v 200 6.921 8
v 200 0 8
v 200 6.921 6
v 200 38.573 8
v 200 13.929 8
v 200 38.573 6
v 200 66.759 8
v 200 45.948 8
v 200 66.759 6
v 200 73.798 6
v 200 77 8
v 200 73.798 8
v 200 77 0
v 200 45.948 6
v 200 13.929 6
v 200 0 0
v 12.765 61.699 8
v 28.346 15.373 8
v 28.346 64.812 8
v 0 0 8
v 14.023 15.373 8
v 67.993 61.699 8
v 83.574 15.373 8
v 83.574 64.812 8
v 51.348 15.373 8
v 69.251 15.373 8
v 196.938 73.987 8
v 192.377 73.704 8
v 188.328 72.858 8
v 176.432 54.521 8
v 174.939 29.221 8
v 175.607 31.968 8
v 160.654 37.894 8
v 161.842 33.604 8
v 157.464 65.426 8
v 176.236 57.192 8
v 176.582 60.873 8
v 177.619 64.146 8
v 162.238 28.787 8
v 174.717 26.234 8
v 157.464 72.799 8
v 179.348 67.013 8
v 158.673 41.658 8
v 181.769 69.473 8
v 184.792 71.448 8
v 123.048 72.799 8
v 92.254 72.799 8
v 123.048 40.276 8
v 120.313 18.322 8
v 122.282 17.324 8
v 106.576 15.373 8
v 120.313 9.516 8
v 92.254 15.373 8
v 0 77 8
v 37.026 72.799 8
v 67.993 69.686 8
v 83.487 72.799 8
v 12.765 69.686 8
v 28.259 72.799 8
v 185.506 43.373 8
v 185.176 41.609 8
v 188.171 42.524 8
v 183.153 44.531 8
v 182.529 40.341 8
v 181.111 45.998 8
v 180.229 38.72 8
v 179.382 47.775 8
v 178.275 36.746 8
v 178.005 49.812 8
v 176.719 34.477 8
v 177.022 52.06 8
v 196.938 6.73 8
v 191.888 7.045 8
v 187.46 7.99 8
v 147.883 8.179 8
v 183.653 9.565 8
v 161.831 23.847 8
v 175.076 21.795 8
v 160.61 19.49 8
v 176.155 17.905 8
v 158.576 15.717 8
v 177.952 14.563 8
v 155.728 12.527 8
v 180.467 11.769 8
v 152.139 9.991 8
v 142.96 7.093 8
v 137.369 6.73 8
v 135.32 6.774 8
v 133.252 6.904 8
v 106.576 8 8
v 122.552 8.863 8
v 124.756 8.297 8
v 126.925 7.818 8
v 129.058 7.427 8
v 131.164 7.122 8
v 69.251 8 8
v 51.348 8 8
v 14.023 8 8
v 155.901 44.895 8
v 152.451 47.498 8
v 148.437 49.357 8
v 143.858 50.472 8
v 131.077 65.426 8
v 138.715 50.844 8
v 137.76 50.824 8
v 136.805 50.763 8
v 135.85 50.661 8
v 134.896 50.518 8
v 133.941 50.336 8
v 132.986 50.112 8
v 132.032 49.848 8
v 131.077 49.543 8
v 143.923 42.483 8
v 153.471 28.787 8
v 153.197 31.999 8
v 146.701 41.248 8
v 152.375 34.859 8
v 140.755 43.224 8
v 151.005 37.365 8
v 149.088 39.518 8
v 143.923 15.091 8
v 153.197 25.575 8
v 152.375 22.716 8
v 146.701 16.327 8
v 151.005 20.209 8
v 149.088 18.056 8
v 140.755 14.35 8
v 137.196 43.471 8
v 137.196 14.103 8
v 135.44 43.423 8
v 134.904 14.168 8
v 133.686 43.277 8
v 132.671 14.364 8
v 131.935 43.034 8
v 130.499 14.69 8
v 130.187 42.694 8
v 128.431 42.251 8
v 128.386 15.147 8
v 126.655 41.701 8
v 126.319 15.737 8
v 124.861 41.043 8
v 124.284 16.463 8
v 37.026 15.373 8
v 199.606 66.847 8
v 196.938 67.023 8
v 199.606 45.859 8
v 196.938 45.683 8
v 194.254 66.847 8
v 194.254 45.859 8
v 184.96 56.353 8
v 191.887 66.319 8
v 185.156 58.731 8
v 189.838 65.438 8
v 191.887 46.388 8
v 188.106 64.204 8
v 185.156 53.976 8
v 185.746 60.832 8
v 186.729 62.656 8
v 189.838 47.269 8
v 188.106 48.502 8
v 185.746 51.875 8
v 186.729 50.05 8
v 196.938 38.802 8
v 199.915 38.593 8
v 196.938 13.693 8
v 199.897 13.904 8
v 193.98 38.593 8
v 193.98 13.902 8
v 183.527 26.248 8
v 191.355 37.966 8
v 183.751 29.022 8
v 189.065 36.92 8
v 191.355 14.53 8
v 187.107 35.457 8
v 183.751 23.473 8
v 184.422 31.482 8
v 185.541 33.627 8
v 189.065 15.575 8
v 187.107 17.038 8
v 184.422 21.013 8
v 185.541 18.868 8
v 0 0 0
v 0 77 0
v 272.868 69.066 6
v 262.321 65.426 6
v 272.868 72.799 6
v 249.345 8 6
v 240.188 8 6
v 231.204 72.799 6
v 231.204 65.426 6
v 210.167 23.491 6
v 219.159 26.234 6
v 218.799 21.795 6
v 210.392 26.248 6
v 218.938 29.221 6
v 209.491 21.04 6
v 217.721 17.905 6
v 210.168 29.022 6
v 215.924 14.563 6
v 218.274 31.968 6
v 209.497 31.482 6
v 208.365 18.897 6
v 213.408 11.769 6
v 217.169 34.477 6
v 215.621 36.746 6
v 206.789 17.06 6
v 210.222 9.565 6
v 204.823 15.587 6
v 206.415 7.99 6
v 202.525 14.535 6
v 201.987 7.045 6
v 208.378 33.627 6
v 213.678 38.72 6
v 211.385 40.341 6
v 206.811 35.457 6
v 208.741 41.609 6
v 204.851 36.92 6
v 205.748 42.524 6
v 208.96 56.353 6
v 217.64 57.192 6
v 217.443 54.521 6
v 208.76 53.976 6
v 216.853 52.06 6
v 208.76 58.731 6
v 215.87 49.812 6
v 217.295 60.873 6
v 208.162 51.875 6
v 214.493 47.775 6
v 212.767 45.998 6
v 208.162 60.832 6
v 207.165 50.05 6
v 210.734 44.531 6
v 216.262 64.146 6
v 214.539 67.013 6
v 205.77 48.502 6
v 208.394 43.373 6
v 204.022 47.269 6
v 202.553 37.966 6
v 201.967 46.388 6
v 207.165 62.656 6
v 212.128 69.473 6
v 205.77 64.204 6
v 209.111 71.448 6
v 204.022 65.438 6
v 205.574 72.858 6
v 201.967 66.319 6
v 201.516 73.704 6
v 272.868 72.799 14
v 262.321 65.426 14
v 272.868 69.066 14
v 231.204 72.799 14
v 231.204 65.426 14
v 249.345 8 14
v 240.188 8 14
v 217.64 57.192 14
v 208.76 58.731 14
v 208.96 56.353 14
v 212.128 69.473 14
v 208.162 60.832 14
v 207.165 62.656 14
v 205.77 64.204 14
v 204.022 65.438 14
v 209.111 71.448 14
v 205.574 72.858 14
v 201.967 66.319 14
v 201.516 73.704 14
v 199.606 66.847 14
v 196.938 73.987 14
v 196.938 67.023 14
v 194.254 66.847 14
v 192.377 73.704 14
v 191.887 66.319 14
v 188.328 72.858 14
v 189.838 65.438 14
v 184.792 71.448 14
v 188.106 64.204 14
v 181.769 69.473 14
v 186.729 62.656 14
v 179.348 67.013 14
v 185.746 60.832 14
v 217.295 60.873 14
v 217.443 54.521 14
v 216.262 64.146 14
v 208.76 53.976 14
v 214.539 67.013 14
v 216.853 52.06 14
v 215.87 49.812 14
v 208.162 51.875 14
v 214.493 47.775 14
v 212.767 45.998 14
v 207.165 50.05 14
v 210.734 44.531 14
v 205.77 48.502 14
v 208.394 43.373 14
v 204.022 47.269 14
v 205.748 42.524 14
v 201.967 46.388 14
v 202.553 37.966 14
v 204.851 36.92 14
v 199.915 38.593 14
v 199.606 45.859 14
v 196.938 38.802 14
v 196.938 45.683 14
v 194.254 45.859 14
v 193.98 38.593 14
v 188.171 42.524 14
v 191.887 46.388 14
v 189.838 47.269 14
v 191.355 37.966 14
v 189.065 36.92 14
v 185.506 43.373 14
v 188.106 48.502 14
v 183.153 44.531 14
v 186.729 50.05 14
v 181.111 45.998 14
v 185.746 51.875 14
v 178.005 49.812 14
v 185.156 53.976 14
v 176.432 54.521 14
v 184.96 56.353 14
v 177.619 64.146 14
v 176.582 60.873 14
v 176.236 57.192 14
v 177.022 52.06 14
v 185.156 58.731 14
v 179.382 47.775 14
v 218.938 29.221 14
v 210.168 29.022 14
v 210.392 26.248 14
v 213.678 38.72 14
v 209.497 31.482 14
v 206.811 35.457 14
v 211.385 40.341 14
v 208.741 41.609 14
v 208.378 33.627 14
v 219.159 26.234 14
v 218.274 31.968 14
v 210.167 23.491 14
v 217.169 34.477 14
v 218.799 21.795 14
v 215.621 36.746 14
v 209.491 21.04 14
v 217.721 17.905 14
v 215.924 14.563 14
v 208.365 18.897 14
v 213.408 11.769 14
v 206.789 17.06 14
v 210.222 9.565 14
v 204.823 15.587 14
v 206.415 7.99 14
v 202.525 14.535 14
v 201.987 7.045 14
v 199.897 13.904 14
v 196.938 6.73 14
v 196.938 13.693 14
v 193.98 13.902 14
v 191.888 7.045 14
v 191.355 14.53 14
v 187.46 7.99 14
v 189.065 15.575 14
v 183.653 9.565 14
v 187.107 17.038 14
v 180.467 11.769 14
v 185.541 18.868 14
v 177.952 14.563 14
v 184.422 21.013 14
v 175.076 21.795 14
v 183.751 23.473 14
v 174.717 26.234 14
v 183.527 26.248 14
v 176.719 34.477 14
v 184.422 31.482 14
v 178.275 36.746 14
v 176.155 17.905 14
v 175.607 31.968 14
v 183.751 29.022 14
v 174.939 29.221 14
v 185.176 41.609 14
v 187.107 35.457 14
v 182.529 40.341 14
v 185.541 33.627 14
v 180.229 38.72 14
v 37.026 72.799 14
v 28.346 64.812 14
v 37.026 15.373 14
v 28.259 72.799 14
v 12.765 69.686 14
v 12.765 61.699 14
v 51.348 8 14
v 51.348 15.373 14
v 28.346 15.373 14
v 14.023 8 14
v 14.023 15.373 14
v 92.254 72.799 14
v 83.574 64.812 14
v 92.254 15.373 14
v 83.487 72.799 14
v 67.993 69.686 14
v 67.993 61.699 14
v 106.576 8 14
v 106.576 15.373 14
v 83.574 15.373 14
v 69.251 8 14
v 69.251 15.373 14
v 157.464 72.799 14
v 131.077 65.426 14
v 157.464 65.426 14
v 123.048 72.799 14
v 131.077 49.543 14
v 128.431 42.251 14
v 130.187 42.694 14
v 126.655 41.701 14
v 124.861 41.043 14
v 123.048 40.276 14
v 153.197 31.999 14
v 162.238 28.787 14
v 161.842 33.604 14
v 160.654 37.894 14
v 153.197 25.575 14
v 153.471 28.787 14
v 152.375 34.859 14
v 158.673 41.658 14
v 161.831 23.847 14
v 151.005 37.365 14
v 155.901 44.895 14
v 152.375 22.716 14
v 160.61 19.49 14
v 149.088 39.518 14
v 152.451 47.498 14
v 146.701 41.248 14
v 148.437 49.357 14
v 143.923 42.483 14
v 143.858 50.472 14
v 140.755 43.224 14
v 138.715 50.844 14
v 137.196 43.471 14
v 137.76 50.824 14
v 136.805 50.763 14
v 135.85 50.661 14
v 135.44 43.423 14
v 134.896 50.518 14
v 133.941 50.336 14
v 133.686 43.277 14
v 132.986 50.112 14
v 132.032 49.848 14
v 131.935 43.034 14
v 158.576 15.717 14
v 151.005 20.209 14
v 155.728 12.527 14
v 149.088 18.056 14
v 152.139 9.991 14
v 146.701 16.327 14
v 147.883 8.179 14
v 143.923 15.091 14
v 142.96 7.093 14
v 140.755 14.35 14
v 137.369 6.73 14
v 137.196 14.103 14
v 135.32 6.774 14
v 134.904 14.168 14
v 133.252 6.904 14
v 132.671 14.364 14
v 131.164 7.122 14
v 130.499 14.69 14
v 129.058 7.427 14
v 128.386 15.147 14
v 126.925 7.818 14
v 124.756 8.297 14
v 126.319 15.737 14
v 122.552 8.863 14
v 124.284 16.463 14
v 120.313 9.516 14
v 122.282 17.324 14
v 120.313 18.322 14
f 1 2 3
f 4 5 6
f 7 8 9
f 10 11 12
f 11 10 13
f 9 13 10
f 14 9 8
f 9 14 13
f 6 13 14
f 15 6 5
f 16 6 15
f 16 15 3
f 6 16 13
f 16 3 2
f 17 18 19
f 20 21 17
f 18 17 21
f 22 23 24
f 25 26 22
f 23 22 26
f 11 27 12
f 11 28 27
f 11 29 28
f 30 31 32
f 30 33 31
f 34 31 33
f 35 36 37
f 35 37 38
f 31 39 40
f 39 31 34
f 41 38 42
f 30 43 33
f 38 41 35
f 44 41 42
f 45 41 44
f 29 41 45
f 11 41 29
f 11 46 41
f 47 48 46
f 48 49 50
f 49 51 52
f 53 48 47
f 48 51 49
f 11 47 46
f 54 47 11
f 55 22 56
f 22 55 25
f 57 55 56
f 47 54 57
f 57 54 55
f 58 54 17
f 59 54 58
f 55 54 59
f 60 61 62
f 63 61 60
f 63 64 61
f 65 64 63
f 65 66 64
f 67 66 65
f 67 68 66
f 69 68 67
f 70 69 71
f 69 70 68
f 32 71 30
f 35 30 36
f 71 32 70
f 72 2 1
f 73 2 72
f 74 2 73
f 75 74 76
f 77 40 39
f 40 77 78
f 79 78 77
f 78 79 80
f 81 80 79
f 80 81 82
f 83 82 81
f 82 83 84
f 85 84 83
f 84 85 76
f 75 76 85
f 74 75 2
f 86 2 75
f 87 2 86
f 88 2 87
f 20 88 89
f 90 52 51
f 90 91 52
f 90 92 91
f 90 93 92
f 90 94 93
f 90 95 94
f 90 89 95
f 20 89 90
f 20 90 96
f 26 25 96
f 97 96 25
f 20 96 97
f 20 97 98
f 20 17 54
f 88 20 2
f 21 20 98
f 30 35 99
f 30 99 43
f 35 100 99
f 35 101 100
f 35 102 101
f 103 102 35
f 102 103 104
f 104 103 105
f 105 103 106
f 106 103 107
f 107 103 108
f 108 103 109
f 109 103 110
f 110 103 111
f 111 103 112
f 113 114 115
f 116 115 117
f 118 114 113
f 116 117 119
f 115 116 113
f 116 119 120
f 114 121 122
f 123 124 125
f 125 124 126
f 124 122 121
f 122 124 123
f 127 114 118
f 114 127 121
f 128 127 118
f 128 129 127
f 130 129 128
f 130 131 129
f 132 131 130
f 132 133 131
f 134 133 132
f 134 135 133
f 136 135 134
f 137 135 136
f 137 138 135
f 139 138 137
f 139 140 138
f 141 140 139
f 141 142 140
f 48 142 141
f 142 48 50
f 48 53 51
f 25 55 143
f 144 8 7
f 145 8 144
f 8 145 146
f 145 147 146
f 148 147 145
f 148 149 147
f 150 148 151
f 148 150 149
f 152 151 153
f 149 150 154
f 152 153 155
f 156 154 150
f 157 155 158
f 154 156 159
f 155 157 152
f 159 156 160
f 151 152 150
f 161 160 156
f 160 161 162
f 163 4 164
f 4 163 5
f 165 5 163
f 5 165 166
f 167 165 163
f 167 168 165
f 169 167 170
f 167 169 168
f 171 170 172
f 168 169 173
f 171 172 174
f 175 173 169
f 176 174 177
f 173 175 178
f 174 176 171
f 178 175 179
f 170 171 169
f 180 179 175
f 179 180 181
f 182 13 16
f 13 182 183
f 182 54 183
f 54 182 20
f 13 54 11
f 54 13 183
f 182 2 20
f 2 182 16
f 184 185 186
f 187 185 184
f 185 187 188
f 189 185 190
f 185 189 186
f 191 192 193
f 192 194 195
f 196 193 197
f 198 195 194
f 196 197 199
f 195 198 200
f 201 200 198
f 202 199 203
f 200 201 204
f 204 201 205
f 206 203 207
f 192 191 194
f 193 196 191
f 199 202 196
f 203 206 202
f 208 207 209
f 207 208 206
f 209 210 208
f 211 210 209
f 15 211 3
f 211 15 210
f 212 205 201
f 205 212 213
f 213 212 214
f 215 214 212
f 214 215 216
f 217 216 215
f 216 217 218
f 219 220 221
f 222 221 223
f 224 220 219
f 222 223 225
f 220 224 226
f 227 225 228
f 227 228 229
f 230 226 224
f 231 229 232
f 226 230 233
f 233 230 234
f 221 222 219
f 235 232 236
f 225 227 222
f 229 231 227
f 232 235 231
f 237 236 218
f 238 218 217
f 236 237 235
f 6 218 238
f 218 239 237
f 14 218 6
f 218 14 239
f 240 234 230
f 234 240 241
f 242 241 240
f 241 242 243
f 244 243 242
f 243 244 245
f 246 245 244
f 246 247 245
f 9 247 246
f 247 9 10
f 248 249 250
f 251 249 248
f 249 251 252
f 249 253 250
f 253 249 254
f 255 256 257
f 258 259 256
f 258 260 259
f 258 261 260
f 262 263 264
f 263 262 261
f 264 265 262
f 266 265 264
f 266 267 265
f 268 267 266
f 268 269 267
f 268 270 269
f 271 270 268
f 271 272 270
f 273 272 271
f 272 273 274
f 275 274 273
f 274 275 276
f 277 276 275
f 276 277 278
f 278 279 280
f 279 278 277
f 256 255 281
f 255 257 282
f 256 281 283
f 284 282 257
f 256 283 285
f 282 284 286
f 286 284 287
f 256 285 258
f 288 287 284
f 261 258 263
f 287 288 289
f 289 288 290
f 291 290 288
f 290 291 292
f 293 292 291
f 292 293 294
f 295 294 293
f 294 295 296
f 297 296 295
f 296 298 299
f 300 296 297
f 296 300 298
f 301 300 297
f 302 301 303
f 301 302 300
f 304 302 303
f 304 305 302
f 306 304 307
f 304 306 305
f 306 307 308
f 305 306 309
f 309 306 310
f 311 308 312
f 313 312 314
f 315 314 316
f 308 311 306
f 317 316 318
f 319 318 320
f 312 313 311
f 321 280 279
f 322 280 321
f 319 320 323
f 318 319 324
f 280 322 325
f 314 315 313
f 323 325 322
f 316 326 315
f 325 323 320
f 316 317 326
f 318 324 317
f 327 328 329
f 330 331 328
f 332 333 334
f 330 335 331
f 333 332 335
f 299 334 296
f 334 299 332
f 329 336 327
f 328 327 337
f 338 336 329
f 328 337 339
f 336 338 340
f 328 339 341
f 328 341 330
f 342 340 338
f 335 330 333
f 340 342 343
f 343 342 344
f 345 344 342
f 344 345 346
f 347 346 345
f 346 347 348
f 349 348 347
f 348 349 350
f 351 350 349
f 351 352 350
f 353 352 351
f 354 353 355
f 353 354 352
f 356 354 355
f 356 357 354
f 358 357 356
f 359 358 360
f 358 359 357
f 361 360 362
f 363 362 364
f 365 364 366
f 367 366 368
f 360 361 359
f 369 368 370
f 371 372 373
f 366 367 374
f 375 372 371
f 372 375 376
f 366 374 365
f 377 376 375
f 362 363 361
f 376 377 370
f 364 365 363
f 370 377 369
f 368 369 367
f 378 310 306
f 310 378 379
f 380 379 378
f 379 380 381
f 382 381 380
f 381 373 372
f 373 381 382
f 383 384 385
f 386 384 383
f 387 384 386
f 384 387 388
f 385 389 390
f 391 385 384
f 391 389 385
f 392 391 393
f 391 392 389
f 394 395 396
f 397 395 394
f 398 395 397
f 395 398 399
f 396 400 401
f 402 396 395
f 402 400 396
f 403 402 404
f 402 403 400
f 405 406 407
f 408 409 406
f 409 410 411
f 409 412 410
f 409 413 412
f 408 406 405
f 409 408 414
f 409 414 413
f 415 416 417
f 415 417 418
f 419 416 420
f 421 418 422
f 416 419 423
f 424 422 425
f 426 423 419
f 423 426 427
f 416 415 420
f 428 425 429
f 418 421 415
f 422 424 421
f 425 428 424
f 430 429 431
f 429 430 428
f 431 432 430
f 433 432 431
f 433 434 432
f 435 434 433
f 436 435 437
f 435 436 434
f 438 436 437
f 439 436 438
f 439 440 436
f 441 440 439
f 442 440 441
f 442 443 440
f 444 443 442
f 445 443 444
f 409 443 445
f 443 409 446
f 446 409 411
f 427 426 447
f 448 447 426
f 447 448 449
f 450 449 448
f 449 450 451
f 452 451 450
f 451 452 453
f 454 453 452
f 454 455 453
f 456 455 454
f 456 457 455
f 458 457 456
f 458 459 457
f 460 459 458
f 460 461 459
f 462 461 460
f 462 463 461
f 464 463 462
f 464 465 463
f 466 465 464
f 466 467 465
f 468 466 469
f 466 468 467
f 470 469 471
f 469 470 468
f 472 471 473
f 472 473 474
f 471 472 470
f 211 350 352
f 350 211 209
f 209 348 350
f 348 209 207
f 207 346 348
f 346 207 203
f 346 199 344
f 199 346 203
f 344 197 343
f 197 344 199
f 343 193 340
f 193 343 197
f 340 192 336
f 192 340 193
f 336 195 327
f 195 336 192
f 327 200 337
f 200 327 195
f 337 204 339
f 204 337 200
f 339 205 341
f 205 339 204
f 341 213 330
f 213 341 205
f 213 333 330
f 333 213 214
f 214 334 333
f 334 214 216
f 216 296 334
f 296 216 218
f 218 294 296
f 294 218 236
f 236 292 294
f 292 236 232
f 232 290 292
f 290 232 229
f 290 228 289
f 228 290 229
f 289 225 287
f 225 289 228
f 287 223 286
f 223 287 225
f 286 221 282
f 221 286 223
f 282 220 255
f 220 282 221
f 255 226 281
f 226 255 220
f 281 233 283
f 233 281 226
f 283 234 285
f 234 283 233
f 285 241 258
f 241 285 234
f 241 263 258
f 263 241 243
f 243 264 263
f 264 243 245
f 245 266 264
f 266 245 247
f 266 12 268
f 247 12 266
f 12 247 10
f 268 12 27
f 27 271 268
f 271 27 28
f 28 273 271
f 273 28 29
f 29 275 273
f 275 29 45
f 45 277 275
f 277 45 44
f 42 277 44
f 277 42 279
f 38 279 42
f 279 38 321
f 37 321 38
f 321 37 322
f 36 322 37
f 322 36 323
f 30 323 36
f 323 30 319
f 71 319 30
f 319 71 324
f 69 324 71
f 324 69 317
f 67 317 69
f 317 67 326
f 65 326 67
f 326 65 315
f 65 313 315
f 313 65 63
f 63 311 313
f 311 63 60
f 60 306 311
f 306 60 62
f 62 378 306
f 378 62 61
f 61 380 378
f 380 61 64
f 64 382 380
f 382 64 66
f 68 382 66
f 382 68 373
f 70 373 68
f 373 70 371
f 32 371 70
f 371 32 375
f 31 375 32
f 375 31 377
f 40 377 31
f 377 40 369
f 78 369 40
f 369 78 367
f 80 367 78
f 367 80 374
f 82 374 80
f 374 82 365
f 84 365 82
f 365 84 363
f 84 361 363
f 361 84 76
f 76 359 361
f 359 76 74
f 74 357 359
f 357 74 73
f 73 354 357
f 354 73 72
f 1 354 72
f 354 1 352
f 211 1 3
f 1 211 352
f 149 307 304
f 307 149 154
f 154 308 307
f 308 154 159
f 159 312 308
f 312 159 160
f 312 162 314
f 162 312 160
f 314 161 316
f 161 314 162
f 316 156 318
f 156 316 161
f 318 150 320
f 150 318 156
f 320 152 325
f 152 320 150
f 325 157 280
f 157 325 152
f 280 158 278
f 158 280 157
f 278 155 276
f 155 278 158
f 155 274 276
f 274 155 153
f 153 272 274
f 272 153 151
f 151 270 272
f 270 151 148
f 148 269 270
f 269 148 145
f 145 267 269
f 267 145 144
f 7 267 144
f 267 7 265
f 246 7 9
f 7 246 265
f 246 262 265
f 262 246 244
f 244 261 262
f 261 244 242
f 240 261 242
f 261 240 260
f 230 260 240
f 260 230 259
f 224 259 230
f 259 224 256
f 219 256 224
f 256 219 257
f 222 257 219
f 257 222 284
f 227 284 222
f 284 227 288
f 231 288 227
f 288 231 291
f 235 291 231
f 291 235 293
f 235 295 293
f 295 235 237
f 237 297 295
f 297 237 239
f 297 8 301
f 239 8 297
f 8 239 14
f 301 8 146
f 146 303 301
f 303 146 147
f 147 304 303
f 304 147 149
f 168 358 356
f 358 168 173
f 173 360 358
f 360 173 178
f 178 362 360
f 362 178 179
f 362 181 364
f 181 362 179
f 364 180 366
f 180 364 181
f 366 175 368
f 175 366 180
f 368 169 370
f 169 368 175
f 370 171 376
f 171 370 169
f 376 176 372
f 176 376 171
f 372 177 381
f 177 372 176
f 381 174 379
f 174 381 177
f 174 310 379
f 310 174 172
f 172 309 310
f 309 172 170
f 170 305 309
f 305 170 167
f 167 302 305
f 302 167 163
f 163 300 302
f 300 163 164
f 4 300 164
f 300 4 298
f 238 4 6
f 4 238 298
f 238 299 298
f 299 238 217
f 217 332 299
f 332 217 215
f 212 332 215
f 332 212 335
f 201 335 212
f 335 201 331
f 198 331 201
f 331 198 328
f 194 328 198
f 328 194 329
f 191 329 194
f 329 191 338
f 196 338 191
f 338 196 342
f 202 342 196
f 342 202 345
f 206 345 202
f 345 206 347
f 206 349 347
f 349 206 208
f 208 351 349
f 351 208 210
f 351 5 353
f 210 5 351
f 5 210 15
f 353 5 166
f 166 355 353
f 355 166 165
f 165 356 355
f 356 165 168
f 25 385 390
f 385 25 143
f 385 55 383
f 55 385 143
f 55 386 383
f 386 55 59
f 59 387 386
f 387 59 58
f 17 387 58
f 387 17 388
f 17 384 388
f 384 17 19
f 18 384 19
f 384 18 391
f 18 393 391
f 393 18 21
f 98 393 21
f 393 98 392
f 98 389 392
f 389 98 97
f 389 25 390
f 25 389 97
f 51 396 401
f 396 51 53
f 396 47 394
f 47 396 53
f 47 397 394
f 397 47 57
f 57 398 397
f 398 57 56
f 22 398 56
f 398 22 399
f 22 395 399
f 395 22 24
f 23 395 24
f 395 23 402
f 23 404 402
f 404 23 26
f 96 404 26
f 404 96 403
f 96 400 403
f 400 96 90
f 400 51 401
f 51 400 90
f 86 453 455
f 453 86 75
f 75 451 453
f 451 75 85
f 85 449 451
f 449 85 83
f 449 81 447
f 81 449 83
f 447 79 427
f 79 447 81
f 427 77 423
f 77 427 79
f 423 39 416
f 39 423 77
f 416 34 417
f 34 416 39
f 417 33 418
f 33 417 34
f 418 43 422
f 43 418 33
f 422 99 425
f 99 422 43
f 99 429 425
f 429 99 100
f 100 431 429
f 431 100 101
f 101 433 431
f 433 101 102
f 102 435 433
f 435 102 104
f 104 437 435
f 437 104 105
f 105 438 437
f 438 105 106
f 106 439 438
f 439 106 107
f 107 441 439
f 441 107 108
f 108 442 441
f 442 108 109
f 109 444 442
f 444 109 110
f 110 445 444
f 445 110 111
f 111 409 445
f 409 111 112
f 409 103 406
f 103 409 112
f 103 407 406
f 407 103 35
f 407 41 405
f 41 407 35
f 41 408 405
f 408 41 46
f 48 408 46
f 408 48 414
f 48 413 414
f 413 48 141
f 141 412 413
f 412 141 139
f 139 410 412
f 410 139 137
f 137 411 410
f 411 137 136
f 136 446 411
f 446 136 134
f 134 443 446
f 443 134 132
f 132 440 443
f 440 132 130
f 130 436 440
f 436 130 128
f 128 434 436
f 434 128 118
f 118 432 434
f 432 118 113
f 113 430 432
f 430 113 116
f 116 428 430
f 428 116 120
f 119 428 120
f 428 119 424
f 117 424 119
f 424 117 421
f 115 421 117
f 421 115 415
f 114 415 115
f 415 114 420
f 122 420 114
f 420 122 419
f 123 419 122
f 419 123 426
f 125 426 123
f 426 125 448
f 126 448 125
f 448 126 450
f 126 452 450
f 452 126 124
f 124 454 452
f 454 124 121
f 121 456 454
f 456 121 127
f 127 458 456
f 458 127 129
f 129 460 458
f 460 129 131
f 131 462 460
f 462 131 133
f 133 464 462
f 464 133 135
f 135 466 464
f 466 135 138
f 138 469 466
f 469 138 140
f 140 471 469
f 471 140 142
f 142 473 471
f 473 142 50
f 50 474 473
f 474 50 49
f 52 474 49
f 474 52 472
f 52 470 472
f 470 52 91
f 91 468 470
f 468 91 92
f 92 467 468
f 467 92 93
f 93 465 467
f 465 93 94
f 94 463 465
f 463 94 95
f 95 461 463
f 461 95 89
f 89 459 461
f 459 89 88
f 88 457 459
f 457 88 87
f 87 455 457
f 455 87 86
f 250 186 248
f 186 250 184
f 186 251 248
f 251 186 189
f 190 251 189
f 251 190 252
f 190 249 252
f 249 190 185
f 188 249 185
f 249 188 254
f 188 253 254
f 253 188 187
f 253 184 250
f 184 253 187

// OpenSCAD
color ("DarkBlue",1.0) {
    cube (size=[200,77,8],center=false);
}
color ("Silver",1.0) {
    translate([3,8,6])
    linear_extrude (height = 8, center = false) {
        text("11587", font="Ubuntu Condensed", size=64);
    }
}
